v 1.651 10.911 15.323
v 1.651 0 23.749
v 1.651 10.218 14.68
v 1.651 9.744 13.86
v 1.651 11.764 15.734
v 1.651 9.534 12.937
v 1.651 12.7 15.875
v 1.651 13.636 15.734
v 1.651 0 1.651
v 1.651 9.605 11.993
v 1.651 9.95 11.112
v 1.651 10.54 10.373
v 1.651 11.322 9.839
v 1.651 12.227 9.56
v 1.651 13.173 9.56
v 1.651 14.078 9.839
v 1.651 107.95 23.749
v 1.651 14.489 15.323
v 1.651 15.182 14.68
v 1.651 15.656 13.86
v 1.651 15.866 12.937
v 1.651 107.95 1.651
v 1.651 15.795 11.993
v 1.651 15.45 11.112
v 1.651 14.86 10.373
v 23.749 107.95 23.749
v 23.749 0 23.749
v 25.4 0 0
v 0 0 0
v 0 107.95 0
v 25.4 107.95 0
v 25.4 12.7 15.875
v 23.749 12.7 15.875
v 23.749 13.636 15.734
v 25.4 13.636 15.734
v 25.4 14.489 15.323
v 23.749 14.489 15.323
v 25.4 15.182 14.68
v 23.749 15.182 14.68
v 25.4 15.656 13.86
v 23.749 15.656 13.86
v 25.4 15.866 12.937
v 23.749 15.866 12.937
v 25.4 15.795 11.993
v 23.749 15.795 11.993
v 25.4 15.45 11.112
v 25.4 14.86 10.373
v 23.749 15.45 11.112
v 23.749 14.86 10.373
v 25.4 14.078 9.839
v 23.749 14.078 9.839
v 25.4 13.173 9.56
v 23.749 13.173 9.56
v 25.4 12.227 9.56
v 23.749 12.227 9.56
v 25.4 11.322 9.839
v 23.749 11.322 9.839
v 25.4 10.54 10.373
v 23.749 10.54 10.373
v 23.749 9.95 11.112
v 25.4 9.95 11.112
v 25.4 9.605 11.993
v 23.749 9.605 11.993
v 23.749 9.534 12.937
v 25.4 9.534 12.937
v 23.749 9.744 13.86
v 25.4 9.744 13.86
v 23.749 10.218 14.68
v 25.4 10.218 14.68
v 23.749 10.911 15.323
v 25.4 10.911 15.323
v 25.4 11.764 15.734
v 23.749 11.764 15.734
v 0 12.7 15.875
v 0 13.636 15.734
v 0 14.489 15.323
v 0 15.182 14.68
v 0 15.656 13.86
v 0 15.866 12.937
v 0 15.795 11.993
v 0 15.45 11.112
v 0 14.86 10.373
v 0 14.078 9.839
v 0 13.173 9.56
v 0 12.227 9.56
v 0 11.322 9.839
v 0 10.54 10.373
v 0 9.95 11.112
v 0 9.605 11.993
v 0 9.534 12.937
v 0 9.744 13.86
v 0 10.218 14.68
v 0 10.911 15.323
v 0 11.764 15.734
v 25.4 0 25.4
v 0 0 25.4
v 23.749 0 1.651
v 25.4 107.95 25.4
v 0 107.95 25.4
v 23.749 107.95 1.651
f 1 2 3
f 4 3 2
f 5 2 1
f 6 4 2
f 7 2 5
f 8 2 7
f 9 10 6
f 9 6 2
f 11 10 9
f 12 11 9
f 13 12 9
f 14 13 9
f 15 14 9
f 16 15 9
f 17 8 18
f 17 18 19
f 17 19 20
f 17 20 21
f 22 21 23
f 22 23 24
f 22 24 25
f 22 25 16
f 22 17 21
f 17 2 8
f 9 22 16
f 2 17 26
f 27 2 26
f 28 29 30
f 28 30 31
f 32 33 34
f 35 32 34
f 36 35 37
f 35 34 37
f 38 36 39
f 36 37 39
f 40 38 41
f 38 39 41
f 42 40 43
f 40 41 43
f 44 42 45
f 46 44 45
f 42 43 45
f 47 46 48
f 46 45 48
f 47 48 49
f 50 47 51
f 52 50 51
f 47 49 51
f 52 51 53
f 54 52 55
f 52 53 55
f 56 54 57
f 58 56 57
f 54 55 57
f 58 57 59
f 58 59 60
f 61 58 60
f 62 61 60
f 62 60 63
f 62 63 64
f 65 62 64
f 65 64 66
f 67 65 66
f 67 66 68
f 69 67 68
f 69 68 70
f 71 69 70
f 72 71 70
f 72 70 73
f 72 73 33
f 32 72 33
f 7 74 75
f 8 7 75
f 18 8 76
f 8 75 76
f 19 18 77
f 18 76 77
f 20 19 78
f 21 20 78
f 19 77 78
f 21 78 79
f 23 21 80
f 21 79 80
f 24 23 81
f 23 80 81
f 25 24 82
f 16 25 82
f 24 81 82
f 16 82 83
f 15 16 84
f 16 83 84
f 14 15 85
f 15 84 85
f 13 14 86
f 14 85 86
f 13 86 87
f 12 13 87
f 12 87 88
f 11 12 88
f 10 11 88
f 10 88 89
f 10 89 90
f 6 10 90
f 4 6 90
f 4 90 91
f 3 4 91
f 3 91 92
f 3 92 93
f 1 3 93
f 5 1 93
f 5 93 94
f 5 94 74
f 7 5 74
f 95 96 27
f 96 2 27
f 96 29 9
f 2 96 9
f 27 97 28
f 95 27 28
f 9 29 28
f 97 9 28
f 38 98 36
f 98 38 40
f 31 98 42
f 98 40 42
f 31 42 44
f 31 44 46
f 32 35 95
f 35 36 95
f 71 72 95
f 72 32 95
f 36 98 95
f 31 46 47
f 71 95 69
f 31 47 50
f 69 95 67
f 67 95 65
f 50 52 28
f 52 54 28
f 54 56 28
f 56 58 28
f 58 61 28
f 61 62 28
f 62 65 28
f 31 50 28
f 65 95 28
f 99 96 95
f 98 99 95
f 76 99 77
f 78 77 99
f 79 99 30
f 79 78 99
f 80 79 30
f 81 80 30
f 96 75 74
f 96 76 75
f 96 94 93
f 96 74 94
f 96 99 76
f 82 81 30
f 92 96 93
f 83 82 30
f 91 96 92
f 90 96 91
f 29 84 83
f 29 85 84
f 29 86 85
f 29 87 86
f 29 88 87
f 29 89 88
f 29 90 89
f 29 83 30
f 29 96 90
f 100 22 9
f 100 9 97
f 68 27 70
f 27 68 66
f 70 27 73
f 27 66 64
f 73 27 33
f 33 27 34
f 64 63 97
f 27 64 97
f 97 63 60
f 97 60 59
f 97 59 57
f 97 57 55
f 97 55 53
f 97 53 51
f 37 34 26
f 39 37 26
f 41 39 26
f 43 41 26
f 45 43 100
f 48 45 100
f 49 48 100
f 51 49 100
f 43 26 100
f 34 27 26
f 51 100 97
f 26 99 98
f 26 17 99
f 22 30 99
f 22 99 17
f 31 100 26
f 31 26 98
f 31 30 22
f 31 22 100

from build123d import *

# Parameters (mm, degrees)
SKETCH1_W           = 25.4
SKETCH1_H           = 25.4
BOSS_EXTRUDE1_DEPTH = 107.95
SKETCH2_W           = 22.098
SKETCH2_H           = 22.098
CUT_EXTRUDE1_DEPTH  = 114.769602707
SKETCH3_R           = 3.175
CUT_EXTRUDE2_DEPTH  = 114.769602707


with BuildPart() as part:
    # Sketch1 → Boss-Extrude1 (new body)
    with BuildSketch(Plane(origin=(0, 0, 0), x_dir=(1, 0, 0), z_dir=(0, 1, 0))):
        with Locations((12.7, -12.7)):
            Rectangle(SKETCH1_W, SKETCH1_H)
    extrude(amount=BOSS_EXTRUDE1_DEPTH)

    # Sketch2 → Cut-Extrude1 (cut, through all)
    with BuildSketch(Plane(origin=(0, 107.95, 0), x_dir=(1, 0, 0), z_dir=(0, 1, 0))):
        with Locations((12.7, -12.7)):
            Rectangle(SKETCH2_W, SKETCH2_H)
    extrude(amount=-CUT_EXTRUDE1_DEPTH, mode=Mode.SUBTRACT)

    # Sketch3 → Cut-Extrude2 (cut, through all)
    with BuildSketch(Plane.ZY):
        with Locations((12.7, 12.7)):
            Circle(SKETCH3_R)
    extrude(amount=-CUT_EXTRUDE2_DEPTH, mode=Mode.SUBTRACT)


solid = part.part
